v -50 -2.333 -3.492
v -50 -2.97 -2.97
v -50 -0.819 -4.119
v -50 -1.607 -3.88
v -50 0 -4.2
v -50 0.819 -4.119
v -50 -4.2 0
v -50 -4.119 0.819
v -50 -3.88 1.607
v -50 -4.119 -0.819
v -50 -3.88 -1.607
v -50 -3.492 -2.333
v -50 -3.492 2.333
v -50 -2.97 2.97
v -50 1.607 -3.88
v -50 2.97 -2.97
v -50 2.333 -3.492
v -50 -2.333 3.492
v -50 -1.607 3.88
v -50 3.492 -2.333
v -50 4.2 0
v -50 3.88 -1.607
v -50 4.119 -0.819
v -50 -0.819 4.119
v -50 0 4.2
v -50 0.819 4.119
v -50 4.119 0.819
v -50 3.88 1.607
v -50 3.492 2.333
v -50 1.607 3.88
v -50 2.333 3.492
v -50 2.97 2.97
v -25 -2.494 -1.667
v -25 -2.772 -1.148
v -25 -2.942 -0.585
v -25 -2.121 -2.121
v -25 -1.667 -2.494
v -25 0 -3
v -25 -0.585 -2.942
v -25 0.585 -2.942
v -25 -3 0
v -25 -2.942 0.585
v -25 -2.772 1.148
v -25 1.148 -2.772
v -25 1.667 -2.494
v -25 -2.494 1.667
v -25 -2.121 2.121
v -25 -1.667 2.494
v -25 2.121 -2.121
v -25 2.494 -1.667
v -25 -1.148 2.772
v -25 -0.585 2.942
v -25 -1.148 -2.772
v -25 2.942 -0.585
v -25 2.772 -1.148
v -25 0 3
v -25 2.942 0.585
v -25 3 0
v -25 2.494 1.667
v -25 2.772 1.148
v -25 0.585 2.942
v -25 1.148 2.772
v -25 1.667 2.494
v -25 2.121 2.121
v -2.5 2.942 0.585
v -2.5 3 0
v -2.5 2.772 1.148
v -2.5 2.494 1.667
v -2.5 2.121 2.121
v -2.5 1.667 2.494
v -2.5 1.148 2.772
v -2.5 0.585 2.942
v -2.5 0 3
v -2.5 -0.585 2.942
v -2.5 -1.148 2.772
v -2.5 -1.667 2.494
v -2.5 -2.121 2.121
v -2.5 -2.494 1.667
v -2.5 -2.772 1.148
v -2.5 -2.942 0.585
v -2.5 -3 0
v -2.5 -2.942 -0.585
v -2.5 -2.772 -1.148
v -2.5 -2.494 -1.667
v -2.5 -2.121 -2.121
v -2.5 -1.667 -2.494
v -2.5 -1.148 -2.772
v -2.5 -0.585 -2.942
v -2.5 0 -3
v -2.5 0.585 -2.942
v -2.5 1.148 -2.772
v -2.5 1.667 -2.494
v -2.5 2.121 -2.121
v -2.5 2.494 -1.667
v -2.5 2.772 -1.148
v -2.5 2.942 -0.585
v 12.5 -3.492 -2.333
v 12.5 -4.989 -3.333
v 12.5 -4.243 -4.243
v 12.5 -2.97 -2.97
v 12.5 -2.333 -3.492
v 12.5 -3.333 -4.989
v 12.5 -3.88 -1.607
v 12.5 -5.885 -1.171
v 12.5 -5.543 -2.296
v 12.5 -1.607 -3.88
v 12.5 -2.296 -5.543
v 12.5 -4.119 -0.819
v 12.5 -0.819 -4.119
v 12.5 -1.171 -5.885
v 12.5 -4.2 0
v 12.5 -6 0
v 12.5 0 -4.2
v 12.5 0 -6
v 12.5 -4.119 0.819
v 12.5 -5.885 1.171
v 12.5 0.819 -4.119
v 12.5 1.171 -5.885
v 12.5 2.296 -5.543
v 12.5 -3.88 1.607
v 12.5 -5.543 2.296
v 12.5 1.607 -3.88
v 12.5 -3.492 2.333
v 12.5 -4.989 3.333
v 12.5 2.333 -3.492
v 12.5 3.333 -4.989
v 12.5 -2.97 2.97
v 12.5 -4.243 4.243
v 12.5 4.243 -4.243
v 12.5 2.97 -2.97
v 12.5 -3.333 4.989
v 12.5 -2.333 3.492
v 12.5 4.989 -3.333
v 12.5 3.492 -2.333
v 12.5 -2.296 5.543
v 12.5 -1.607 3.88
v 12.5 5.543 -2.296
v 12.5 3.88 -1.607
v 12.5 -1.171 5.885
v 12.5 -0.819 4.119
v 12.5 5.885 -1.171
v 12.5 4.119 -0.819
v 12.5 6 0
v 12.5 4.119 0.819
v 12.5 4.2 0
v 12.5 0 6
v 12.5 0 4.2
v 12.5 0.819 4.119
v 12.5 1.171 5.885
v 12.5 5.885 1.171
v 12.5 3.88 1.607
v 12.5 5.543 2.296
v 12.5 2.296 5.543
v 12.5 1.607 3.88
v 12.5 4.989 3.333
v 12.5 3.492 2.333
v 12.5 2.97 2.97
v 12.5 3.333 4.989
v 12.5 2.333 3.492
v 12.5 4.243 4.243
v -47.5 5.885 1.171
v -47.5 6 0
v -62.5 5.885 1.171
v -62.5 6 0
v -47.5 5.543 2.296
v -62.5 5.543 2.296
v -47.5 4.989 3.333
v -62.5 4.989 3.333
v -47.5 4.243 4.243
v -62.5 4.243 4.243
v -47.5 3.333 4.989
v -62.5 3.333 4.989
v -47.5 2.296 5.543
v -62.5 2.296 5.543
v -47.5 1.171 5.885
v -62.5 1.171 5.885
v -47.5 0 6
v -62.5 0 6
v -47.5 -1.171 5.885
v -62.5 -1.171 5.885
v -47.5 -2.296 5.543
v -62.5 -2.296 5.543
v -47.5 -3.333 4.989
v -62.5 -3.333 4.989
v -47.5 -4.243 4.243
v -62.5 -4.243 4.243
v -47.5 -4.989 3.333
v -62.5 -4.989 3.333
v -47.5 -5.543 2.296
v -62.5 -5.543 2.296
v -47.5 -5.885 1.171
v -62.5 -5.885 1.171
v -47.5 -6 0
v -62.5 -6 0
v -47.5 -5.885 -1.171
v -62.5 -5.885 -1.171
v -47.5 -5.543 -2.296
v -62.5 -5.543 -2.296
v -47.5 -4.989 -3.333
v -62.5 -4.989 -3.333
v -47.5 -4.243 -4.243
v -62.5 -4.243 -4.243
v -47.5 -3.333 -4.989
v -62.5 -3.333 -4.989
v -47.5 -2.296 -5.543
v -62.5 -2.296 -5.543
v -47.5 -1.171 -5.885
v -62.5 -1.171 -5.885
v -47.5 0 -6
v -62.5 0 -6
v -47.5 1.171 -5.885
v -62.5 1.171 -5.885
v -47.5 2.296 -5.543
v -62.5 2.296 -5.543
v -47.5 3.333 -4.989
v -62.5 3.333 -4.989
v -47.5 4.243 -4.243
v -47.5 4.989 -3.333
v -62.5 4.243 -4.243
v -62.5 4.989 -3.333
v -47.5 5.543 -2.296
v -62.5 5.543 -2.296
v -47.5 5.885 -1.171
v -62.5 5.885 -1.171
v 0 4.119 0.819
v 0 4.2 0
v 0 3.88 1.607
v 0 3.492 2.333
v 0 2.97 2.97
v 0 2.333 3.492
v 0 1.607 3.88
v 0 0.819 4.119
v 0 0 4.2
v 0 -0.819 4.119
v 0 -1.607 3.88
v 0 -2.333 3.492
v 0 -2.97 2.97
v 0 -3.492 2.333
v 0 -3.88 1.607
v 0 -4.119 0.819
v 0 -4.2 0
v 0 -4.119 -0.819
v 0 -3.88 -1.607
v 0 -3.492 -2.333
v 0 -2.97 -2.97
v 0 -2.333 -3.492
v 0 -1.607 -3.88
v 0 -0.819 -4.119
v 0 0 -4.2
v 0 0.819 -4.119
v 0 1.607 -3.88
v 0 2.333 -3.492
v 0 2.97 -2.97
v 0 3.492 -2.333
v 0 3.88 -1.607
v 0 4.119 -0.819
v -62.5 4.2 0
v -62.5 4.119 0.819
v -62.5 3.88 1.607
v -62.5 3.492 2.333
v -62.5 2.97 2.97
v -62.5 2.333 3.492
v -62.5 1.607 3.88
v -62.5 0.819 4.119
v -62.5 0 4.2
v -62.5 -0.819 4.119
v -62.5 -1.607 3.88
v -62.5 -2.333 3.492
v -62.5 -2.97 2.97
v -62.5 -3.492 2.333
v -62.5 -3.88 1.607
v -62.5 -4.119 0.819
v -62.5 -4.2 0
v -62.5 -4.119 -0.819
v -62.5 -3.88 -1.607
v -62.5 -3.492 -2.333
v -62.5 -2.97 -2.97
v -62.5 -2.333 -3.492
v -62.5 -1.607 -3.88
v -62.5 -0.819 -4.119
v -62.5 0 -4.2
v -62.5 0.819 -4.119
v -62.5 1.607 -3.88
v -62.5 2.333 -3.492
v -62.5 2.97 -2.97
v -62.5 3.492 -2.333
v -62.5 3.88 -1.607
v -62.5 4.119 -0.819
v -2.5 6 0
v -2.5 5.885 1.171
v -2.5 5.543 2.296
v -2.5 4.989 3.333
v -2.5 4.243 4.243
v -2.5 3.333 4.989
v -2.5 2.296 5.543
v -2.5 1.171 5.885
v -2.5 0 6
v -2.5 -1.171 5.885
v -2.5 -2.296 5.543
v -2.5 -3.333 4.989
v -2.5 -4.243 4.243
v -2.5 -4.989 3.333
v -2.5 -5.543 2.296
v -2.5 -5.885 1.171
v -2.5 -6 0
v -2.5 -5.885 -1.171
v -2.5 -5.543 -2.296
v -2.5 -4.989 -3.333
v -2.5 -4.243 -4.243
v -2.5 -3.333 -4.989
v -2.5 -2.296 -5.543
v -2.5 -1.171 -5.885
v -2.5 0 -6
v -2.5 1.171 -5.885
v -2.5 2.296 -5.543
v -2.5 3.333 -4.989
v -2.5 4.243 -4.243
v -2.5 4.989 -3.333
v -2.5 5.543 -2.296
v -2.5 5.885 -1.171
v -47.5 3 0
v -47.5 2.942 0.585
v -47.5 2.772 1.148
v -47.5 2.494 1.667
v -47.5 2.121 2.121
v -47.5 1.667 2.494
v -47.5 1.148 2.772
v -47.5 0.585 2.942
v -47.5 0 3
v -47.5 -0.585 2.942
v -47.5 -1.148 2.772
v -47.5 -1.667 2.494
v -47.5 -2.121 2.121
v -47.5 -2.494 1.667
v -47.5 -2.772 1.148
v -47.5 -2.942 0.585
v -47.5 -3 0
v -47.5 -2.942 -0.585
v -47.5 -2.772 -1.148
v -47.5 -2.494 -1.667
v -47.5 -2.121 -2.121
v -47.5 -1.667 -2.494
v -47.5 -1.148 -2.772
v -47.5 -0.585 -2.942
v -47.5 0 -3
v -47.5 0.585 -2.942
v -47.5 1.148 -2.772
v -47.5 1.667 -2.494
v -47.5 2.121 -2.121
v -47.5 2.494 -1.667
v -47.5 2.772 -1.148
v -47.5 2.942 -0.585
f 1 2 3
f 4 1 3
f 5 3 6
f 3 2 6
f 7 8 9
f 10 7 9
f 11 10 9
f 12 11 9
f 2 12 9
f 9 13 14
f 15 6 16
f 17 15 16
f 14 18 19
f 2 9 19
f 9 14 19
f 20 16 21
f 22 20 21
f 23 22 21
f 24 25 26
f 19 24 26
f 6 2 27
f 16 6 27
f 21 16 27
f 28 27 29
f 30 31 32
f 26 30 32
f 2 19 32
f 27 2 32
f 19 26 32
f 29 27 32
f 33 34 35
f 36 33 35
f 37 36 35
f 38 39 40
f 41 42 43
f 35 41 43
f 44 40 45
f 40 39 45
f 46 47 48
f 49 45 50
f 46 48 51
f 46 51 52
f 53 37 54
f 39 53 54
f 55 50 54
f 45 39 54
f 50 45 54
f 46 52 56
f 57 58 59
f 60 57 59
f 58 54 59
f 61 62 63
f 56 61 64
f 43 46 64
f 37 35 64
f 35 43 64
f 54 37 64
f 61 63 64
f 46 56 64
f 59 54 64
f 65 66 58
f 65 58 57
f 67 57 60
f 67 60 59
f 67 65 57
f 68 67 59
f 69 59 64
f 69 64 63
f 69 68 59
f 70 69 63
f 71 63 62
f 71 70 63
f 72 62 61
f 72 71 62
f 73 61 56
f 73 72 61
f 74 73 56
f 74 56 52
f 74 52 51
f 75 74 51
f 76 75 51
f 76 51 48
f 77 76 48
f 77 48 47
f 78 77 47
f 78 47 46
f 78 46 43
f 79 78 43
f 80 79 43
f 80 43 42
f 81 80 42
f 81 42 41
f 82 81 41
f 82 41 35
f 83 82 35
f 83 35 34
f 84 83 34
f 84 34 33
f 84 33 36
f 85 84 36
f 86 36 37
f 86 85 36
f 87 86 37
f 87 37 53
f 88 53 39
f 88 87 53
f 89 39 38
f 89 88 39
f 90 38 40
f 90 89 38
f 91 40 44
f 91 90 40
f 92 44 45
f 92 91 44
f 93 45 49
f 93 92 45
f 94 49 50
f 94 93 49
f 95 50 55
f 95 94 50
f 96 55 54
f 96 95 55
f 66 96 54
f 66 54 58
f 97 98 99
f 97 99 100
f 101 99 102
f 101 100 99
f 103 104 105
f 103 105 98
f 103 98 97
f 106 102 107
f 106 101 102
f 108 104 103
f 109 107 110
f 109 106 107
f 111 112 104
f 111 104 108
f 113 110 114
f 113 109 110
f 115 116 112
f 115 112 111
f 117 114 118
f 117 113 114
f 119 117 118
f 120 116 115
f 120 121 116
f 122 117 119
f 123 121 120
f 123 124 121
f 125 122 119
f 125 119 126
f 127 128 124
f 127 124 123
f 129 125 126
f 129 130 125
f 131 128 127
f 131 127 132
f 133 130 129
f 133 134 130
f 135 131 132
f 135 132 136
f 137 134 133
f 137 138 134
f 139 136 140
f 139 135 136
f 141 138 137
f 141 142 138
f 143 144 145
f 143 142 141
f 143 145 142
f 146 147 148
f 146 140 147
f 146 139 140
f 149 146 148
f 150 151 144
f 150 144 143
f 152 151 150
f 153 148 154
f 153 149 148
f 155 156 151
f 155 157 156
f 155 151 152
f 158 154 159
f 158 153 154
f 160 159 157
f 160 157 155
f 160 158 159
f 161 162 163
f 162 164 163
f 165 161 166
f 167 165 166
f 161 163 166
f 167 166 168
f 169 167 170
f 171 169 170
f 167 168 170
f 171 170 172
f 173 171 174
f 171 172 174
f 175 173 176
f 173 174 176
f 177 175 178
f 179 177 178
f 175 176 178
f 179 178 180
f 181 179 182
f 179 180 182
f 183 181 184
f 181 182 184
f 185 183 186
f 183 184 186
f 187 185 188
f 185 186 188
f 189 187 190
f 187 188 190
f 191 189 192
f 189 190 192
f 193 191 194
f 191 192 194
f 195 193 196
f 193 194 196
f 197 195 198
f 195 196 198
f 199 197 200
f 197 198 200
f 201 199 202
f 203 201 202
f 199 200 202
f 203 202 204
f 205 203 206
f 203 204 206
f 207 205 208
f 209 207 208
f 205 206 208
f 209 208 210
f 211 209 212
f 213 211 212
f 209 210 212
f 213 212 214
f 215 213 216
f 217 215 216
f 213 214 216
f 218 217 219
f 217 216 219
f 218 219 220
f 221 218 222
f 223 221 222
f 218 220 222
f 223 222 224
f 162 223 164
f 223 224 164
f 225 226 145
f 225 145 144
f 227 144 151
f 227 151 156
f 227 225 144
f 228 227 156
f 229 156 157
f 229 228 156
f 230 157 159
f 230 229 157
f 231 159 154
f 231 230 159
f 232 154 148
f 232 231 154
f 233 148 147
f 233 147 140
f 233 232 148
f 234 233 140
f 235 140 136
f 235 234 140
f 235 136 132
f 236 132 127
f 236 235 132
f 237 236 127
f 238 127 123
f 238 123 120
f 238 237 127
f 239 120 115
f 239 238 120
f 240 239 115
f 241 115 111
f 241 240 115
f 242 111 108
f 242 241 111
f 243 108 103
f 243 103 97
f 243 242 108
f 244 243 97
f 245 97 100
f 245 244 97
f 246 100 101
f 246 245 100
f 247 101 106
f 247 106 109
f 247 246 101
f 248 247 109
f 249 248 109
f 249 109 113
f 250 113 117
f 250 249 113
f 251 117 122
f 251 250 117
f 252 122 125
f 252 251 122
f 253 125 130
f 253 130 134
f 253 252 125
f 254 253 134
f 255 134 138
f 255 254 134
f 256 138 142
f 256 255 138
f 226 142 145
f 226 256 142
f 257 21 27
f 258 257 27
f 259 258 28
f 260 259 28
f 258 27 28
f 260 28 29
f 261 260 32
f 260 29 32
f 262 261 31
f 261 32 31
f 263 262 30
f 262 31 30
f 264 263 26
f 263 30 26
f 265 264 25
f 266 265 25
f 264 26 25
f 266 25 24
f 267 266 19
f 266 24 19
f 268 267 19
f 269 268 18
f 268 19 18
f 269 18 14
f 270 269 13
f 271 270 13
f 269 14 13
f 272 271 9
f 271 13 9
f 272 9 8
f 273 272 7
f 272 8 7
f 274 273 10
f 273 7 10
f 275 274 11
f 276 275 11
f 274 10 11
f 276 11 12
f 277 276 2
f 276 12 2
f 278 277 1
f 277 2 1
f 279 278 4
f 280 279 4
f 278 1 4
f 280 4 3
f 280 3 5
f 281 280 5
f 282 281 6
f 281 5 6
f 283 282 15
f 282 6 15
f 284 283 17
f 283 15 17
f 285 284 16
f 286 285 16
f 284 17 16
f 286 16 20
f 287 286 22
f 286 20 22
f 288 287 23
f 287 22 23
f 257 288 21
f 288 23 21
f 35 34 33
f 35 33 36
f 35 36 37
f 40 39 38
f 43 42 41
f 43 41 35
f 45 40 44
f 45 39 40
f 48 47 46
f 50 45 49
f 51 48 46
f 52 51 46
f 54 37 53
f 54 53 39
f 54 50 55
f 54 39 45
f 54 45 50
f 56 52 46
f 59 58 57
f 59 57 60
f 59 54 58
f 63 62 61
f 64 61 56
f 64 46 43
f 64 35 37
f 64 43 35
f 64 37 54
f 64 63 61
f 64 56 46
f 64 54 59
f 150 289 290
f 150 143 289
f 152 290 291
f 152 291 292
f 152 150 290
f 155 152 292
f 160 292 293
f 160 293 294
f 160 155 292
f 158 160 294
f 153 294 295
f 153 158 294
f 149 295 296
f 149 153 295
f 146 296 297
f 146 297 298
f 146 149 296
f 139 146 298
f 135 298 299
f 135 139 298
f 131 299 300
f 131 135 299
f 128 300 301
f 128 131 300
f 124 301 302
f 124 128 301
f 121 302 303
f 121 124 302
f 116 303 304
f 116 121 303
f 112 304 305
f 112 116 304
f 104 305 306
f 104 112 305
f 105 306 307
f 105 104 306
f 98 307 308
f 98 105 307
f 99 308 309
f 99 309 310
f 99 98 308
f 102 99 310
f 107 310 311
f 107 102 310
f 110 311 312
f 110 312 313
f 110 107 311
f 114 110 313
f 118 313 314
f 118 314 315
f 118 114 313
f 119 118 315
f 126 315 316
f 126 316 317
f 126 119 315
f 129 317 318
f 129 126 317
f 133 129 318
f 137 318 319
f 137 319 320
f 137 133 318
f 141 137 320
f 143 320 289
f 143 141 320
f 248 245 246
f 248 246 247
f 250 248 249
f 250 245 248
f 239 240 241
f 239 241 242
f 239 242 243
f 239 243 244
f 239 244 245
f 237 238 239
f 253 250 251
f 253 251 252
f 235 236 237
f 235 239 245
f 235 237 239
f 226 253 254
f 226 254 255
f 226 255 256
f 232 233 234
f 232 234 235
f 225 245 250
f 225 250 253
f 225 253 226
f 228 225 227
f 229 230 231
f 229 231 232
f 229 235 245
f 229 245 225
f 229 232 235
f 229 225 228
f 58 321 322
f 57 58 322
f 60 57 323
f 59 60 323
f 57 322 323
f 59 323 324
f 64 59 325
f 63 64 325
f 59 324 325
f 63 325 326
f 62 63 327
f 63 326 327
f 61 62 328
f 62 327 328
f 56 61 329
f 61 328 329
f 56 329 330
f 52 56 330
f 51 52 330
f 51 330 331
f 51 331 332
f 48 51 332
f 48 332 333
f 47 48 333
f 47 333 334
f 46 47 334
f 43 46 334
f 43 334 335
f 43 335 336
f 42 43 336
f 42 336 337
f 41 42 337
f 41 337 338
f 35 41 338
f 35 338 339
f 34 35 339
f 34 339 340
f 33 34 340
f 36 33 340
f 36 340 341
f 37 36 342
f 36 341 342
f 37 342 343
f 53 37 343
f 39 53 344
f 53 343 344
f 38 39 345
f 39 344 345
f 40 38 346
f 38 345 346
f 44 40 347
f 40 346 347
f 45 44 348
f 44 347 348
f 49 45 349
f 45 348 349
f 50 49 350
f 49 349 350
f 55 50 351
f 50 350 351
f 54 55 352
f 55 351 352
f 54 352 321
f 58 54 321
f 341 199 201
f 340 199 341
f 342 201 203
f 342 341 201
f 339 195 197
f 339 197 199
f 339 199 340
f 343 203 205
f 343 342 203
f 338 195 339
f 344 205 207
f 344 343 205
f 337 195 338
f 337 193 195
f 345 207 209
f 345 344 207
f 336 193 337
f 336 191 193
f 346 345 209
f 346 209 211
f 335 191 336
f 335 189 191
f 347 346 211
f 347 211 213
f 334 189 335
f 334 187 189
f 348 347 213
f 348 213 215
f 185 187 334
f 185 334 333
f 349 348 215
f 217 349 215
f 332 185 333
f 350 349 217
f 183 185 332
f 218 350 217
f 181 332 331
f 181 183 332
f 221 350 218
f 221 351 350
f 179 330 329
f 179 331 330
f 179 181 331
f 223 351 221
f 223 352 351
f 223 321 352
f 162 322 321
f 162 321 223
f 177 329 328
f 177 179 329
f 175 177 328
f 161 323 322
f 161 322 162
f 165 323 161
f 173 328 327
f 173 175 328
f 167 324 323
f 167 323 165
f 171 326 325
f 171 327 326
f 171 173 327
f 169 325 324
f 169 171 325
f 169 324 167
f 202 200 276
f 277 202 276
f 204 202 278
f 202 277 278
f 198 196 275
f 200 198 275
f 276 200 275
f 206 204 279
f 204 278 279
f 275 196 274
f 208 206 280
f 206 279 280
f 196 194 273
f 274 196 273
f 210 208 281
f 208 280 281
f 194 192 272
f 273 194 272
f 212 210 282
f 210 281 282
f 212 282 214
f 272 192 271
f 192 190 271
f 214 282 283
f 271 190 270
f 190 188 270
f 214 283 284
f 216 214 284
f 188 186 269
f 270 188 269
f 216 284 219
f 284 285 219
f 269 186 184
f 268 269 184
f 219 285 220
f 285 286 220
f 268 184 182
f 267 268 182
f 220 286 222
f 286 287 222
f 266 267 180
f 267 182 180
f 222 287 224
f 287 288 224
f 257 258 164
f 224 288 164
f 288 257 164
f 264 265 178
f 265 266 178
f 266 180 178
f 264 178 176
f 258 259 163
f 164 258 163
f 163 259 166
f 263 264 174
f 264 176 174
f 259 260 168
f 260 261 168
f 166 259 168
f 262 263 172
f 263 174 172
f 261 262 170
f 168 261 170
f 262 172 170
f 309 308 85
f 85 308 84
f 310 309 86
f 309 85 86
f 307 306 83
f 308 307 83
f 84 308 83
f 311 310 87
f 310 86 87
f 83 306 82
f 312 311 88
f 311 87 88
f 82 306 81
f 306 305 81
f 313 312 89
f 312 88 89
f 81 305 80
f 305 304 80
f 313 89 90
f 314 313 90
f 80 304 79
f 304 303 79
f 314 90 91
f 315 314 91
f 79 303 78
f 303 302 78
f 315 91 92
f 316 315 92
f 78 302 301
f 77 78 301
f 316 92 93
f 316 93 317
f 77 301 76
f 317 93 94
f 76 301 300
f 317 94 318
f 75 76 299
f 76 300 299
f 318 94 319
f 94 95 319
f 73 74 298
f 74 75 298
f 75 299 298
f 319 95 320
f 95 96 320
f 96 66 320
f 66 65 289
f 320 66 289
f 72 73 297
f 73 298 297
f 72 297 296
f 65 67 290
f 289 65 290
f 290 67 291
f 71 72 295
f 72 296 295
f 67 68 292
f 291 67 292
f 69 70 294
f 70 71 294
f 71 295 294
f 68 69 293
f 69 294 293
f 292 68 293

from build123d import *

# Parameters (mm, degrees)
F0_R     = 6
F0_R_2   = 4.2
F1_DEPTH = 12.5
F0_R_3   = 3
F2_DEPTH = 2.5
F3_DEPTH = 25


# Not quite as in the source:
# - a feature names something its author has since deleted; it is built from what else it names


with BuildPart() as f1:
    # F0 (on Right) → F1 (new body)
    with BuildSketch(Plane.YZ):
        Circle(F0_R)
        Circle(F0_R_2, mode=Mode.SUBTRACT)
    extrude(amount=F1_DEPTH)

    # F0 (on Right) → F2 (join)
    with BuildSketch(Plane.YZ):
        Circle(F0_R)
        Circle(F0_R_2, mode=Mode.SUBTRACT)
        Circle(F0_R_2)
        Circle(F0_R_3, mode=Mode.SUBTRACT)
    extrude(amount=-F2_DEPTH)

    # F0 (on Right) → F3 (join)
    with BuildSketch(Plane.YZ):
        Circle(F0_R_3)
    extrude(amount=-F3_DEPTH)


with BuildPart() as f4_1:
    # F4: instance of F1
    add(f1.part.mirror(Plane(origin=(-25, 0, 0), x_dir=(0, 1, 0), z_dir=(-1, 0, 0))))


solid = Compound([f1.part, f4_1.part])
